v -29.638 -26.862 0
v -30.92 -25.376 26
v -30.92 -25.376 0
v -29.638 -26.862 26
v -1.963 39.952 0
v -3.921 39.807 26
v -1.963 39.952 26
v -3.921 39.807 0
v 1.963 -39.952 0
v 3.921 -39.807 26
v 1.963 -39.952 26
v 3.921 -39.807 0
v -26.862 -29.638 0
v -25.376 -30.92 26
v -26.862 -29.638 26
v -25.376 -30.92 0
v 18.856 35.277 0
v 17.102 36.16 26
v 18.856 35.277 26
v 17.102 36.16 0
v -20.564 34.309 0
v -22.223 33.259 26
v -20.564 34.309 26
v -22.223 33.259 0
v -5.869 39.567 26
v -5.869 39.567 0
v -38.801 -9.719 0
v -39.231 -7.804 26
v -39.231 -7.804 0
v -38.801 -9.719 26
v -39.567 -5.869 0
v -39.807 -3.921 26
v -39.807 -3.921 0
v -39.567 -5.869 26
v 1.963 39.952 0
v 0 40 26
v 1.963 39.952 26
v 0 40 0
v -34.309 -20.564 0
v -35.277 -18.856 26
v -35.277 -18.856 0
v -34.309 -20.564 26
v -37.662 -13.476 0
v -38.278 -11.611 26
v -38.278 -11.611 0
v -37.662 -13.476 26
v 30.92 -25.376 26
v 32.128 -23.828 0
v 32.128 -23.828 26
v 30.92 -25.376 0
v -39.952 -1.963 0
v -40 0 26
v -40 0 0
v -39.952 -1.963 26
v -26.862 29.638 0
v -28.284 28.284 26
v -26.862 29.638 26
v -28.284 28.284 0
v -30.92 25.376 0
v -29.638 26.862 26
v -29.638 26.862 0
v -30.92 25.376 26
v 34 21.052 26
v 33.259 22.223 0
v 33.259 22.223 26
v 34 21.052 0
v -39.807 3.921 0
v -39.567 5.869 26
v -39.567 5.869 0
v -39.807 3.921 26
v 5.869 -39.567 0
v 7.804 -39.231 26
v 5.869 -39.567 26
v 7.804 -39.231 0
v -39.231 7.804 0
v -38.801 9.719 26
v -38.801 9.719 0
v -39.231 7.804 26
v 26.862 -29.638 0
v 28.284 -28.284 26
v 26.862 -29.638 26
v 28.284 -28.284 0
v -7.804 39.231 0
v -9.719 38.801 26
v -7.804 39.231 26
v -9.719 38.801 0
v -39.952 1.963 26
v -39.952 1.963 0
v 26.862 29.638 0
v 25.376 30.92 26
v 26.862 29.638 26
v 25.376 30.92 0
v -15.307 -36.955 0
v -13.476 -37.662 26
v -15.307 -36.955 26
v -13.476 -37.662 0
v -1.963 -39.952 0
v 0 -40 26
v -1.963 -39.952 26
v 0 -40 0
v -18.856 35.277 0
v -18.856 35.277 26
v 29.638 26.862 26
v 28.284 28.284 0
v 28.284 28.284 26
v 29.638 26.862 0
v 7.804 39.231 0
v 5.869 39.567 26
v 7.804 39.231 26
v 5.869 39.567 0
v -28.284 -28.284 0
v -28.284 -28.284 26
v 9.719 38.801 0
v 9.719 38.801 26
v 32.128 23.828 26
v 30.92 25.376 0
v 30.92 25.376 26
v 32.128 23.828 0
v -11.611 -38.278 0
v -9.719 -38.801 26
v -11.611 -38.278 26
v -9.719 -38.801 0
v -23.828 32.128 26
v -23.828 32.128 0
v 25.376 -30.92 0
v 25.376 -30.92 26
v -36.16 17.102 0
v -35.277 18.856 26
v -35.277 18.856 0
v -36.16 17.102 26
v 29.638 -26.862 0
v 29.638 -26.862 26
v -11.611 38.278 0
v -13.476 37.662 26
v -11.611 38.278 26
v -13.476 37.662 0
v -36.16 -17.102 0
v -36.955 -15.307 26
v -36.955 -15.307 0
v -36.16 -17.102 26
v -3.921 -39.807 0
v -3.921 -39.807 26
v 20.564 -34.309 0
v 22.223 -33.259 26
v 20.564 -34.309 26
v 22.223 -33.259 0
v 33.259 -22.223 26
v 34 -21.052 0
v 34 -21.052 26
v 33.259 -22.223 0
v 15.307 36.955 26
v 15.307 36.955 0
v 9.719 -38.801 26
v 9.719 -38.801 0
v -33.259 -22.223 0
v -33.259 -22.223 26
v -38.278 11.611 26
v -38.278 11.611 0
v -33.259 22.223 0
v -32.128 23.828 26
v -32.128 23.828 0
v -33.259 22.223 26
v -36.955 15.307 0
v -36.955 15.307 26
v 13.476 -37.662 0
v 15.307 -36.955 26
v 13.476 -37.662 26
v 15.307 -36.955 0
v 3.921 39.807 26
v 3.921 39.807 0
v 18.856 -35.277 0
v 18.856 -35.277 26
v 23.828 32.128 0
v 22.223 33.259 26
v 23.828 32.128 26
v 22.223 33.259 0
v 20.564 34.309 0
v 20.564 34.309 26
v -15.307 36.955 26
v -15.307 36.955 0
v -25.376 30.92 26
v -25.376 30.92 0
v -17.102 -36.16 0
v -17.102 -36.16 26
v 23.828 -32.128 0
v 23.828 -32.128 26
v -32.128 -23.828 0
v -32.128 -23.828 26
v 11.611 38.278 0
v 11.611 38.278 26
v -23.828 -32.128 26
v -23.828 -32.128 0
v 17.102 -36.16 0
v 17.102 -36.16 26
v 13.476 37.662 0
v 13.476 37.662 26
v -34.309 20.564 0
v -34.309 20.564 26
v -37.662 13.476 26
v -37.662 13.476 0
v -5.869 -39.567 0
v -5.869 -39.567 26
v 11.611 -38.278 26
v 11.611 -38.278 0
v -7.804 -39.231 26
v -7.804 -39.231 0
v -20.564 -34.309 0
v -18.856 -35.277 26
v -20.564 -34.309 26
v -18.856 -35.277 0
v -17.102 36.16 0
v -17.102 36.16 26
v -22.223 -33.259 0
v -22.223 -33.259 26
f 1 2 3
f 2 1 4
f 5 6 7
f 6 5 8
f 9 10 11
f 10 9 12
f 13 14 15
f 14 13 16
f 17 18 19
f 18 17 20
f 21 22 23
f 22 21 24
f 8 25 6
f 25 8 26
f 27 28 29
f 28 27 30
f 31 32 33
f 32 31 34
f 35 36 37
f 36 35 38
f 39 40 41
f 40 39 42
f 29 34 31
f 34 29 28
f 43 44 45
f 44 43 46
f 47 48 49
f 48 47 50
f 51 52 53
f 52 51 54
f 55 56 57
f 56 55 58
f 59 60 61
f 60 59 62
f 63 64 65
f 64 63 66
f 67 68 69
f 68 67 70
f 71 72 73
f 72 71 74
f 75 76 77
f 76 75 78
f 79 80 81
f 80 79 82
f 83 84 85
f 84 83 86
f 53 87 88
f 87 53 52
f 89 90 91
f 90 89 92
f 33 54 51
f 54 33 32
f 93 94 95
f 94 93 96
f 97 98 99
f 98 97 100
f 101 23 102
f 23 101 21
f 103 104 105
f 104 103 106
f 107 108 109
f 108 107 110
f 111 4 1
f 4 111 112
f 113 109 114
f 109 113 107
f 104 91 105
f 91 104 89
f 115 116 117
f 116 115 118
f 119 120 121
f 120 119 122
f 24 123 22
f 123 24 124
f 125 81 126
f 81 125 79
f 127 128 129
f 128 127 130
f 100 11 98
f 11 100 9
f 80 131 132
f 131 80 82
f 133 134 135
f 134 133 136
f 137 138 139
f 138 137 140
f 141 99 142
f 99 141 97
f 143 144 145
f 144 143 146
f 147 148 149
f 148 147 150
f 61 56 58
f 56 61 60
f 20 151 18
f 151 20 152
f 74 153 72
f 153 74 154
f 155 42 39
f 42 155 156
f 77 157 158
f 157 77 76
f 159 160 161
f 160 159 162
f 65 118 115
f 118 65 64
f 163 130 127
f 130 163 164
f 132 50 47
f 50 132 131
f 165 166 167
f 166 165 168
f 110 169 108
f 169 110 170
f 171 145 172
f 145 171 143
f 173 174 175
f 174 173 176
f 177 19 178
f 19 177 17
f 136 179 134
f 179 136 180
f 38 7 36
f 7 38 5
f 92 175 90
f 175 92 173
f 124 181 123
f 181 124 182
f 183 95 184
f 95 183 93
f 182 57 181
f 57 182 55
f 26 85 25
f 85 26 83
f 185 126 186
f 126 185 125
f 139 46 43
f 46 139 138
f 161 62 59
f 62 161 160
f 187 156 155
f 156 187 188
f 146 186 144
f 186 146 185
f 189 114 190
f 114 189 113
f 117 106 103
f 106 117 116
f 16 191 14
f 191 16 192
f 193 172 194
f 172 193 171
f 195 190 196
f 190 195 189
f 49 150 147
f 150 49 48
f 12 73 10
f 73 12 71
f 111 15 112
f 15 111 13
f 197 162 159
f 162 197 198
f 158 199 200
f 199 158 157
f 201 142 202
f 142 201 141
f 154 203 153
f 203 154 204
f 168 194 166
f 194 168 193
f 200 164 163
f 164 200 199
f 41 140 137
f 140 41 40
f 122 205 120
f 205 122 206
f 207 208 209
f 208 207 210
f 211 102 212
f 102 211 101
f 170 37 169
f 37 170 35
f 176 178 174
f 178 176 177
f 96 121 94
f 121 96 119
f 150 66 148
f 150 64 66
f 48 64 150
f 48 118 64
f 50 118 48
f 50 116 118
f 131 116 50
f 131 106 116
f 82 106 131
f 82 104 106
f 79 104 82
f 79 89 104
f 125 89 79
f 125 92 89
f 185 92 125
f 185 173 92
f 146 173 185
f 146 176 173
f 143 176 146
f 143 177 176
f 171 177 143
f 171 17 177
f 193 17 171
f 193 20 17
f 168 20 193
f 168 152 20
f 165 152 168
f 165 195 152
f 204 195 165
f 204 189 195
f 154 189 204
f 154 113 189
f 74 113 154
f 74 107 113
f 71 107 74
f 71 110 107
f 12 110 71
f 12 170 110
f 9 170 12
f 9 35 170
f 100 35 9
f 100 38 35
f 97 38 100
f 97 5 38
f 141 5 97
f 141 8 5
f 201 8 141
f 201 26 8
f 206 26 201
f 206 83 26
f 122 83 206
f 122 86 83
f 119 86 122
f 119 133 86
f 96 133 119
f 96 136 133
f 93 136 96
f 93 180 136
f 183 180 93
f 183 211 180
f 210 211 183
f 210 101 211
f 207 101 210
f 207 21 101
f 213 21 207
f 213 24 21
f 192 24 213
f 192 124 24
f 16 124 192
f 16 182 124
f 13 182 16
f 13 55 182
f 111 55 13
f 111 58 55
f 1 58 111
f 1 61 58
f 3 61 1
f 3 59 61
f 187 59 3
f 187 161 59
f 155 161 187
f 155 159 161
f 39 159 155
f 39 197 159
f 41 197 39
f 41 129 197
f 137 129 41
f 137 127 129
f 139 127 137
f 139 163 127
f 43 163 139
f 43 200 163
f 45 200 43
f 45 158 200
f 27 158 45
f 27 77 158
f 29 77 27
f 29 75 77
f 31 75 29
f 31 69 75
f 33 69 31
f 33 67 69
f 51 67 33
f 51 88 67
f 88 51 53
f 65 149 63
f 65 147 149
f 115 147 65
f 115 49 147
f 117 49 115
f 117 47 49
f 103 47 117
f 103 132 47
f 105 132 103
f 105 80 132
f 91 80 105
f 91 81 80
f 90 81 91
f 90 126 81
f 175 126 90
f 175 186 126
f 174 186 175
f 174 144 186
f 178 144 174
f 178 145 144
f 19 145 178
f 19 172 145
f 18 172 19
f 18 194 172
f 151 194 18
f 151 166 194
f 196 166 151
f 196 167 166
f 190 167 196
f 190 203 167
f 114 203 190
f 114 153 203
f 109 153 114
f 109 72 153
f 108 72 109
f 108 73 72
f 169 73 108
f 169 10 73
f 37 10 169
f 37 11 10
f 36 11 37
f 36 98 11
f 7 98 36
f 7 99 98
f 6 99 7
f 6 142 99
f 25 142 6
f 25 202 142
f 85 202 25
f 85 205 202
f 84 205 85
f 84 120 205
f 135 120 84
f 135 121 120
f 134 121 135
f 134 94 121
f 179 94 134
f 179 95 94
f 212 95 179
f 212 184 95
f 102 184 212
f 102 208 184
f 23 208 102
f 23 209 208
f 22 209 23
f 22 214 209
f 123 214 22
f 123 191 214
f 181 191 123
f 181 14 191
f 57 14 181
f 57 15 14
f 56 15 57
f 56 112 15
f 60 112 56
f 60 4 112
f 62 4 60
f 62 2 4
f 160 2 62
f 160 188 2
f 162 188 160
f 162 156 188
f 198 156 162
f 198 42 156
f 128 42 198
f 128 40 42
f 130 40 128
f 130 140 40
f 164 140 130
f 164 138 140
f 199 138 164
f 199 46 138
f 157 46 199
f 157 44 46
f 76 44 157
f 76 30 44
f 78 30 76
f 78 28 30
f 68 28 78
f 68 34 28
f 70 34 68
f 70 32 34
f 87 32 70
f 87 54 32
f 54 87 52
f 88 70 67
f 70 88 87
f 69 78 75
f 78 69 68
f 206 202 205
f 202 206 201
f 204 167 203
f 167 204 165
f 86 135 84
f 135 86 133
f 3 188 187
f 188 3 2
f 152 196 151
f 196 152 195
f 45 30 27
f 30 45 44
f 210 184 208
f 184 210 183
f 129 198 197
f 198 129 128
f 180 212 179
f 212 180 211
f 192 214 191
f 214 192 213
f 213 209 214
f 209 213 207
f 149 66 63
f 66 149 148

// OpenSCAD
// Round tube holder for 2 mL round-bottom tubes
// Designed for FDM printing, sitting on the XY plane.

// --- Dimensions ---
puck_diameter = 80.0;      // Diameter of the main puck
puck_height   = 26.0;      // Total height of the puck
flat_cut_x     = 34.0;     // The plane x = 34 is the boundary; everything > 34 is removed
seat_circle_d  = 50.0;     // Diameter of the circle where tube seats are centered
tube_diameter  = 11.2;     // Diameter of the tube hole
seat_depth_z   = 20.0;     // Depth from top face to the lowest point of the sphere

$fn = 128;

// --- Calculations ---
puck_radius = puck_diameter / 2;
seat_radius = tube_diameter / 2;
// The sphere bottom is at z = puck_height - seat_depth_z
// The center of the sphere must be at z = (puck_height - seat_depth_z) + seat_radius
sphere_z_center = (puck_height - seat_depth_z) + seat_radius;

// --- Geometry ---

module tube_seat() {
    // The seat consists of a cylinder (the hole) and a sphere (the bottom)
    // To ensure a clean cut, we use a union of the two shapes
    union() {
        // The cylindrical part of the hole
        // It goes from the top face down to the sphere center
        cylinder(h = sphere_z_center - (puck_height - seat_depth_z), d = tube_diameter);
        
        // The spherical bottom
        // We use a sphere centered at sphere_z_center
        translate([0, 0, sphere_z_center])
            sphere(d = tube_diameter);
    }
}

// Main assembly
difference() {
    // 1. The main puck body
    cylinder(h = puck_height, d = puck_diameter);

    // 2. The flat cut for the label (removes everything beyond x = 34)
    // We use a large cube to ensure it cuts through the entire puck
    translate([flat_cut_x, -puck_diameter, -1])
        cube([puck_diameter, puck_diameter * 2, puck_height + 2]);

    // 3. The eight tube seats
    for (i = [0 : 7]) {
        // Calculate angle: first on +X axis (0 degrees), then every 45 degrees
        angle = i * 45;
        
        // Calculate position on the 50mm diameter circle
        // x = r * cos(theta), y = r * sin(theta)
        pos_x = (seat_circle_d / 2) * cos(angle);
        pos_y = (seat_circle_d / 2) * sin(angle);
        
        translate([pos_x, pos_y, 0]) {
            // We translate the seat so its top is at the top of the puck
            // The difference() will subtract it from the top
            translate([0, 0, puck_height - seat_depth_z + (seat_depth_z - (puck_height - 6))])
            // Wait, simpler: The seat is defined relative to its own bottom.
            // Let's just translate the seat module to the correct Z.
            // The seat's top is at Z = puck_height.
            // The seat's bottom is at Z = puck_height - seat_depth_z.
            // The sphere center is at Z = (puck_height - seat_depth_z) + seat_radius.
            // The cylinder part goes from top to sphere center.
            
            // Let's redefine the seat logic for easier translation:
            // We want the seat to be subtracted from the top.
            // The seat module as defined above starts at Z=0. 
            // We need to move it so its top is at puck_height.
            // However, the cylinder in the module starts at 0 and goes up.
            // Let's adjust the module call.
            
            // Corrected Seat Placement:
            // The cylinder in the module goes from 0 to (sphere_z_center - (puck_height - seat_depth_z))
            // We want the top of the cylinder to be at puck_height.
            // So we translate by: puck_height - (cylinder_height)
            // But the cylinder height is actually (sphere_z_center - (puck_height - seat_depth_z))
            // Let's just use a simpler approach:
            // The seat is a cylinder from Z = puck_height - seat_depth_z + seat_radius to Z = puck_height
            // plus a sphere at Z = puck_height - seat_depth_z + seat_radius.
            
            // Re-calculating for the loop:
            translate([0, 0, puck_height - seat_depth_z + seat_radius]) {
                // This is the sphere center.
                // We need to subtract the sphere and the cylinder.
                // Let's use a local difference for the seat to make it easier.
            }
        }
    }
}

// --- REWRITTEN ASSEMBLY FOR CLARITY ---
// (The logic above was getting messy with translations, let's provide the clean version)

// Final clean implementation:
module final_puck() {
    difference() {
        // The base puck
        cylinder(h = puck_height, d = puck_diameter);
        
        // The label cut
        translate([flat_cut_x, -puck_diameter, -1])
            cube([puck_diameter, puck_diameter * 2, puck_height + 2]);
            
        // The seats
        for (i = [0 : 7]) {
            angle = i * 45;
            pos_x = (seat_circle_d / 2) * cos(angle);
            pos_y = (seat_circle_d / 2) * sin(angle);
            
            translate([pos_x, pos_y, 0]) {
                // We subtract the seat from the top.
                // The seat is a cylinder + sphere.
                // The sphere center is at Z = puck_height - seat_depth_z + seat_radius
                // The cylinder goes from the sphere center up to the top.
                
                // To make subtraction easy, we define the seat as a positive object 
                // and subtract it.
                translate([0, 0, puck_height - seat_depth_z + seat_radius]) {
                    // Sphere center
                    sphere(d = tube_diameter);
                    // Cylinder from sphere center to top
                    translate([0, 0, - (puck_height - (puck_height - seat_depth_z + seat_radius))])
                        cylinder(h = puck_height - (puck_height - seat_depth_z + seat_radius), d = tube_diameter);
                }
            }
        }
    }
}

// Execute the clean version
// Note: I'll wrap the whole thing in a single block as requested.
// The logic above is the blueprint. Here is the final code.

// (Self-correction: I will output the final code block now)
